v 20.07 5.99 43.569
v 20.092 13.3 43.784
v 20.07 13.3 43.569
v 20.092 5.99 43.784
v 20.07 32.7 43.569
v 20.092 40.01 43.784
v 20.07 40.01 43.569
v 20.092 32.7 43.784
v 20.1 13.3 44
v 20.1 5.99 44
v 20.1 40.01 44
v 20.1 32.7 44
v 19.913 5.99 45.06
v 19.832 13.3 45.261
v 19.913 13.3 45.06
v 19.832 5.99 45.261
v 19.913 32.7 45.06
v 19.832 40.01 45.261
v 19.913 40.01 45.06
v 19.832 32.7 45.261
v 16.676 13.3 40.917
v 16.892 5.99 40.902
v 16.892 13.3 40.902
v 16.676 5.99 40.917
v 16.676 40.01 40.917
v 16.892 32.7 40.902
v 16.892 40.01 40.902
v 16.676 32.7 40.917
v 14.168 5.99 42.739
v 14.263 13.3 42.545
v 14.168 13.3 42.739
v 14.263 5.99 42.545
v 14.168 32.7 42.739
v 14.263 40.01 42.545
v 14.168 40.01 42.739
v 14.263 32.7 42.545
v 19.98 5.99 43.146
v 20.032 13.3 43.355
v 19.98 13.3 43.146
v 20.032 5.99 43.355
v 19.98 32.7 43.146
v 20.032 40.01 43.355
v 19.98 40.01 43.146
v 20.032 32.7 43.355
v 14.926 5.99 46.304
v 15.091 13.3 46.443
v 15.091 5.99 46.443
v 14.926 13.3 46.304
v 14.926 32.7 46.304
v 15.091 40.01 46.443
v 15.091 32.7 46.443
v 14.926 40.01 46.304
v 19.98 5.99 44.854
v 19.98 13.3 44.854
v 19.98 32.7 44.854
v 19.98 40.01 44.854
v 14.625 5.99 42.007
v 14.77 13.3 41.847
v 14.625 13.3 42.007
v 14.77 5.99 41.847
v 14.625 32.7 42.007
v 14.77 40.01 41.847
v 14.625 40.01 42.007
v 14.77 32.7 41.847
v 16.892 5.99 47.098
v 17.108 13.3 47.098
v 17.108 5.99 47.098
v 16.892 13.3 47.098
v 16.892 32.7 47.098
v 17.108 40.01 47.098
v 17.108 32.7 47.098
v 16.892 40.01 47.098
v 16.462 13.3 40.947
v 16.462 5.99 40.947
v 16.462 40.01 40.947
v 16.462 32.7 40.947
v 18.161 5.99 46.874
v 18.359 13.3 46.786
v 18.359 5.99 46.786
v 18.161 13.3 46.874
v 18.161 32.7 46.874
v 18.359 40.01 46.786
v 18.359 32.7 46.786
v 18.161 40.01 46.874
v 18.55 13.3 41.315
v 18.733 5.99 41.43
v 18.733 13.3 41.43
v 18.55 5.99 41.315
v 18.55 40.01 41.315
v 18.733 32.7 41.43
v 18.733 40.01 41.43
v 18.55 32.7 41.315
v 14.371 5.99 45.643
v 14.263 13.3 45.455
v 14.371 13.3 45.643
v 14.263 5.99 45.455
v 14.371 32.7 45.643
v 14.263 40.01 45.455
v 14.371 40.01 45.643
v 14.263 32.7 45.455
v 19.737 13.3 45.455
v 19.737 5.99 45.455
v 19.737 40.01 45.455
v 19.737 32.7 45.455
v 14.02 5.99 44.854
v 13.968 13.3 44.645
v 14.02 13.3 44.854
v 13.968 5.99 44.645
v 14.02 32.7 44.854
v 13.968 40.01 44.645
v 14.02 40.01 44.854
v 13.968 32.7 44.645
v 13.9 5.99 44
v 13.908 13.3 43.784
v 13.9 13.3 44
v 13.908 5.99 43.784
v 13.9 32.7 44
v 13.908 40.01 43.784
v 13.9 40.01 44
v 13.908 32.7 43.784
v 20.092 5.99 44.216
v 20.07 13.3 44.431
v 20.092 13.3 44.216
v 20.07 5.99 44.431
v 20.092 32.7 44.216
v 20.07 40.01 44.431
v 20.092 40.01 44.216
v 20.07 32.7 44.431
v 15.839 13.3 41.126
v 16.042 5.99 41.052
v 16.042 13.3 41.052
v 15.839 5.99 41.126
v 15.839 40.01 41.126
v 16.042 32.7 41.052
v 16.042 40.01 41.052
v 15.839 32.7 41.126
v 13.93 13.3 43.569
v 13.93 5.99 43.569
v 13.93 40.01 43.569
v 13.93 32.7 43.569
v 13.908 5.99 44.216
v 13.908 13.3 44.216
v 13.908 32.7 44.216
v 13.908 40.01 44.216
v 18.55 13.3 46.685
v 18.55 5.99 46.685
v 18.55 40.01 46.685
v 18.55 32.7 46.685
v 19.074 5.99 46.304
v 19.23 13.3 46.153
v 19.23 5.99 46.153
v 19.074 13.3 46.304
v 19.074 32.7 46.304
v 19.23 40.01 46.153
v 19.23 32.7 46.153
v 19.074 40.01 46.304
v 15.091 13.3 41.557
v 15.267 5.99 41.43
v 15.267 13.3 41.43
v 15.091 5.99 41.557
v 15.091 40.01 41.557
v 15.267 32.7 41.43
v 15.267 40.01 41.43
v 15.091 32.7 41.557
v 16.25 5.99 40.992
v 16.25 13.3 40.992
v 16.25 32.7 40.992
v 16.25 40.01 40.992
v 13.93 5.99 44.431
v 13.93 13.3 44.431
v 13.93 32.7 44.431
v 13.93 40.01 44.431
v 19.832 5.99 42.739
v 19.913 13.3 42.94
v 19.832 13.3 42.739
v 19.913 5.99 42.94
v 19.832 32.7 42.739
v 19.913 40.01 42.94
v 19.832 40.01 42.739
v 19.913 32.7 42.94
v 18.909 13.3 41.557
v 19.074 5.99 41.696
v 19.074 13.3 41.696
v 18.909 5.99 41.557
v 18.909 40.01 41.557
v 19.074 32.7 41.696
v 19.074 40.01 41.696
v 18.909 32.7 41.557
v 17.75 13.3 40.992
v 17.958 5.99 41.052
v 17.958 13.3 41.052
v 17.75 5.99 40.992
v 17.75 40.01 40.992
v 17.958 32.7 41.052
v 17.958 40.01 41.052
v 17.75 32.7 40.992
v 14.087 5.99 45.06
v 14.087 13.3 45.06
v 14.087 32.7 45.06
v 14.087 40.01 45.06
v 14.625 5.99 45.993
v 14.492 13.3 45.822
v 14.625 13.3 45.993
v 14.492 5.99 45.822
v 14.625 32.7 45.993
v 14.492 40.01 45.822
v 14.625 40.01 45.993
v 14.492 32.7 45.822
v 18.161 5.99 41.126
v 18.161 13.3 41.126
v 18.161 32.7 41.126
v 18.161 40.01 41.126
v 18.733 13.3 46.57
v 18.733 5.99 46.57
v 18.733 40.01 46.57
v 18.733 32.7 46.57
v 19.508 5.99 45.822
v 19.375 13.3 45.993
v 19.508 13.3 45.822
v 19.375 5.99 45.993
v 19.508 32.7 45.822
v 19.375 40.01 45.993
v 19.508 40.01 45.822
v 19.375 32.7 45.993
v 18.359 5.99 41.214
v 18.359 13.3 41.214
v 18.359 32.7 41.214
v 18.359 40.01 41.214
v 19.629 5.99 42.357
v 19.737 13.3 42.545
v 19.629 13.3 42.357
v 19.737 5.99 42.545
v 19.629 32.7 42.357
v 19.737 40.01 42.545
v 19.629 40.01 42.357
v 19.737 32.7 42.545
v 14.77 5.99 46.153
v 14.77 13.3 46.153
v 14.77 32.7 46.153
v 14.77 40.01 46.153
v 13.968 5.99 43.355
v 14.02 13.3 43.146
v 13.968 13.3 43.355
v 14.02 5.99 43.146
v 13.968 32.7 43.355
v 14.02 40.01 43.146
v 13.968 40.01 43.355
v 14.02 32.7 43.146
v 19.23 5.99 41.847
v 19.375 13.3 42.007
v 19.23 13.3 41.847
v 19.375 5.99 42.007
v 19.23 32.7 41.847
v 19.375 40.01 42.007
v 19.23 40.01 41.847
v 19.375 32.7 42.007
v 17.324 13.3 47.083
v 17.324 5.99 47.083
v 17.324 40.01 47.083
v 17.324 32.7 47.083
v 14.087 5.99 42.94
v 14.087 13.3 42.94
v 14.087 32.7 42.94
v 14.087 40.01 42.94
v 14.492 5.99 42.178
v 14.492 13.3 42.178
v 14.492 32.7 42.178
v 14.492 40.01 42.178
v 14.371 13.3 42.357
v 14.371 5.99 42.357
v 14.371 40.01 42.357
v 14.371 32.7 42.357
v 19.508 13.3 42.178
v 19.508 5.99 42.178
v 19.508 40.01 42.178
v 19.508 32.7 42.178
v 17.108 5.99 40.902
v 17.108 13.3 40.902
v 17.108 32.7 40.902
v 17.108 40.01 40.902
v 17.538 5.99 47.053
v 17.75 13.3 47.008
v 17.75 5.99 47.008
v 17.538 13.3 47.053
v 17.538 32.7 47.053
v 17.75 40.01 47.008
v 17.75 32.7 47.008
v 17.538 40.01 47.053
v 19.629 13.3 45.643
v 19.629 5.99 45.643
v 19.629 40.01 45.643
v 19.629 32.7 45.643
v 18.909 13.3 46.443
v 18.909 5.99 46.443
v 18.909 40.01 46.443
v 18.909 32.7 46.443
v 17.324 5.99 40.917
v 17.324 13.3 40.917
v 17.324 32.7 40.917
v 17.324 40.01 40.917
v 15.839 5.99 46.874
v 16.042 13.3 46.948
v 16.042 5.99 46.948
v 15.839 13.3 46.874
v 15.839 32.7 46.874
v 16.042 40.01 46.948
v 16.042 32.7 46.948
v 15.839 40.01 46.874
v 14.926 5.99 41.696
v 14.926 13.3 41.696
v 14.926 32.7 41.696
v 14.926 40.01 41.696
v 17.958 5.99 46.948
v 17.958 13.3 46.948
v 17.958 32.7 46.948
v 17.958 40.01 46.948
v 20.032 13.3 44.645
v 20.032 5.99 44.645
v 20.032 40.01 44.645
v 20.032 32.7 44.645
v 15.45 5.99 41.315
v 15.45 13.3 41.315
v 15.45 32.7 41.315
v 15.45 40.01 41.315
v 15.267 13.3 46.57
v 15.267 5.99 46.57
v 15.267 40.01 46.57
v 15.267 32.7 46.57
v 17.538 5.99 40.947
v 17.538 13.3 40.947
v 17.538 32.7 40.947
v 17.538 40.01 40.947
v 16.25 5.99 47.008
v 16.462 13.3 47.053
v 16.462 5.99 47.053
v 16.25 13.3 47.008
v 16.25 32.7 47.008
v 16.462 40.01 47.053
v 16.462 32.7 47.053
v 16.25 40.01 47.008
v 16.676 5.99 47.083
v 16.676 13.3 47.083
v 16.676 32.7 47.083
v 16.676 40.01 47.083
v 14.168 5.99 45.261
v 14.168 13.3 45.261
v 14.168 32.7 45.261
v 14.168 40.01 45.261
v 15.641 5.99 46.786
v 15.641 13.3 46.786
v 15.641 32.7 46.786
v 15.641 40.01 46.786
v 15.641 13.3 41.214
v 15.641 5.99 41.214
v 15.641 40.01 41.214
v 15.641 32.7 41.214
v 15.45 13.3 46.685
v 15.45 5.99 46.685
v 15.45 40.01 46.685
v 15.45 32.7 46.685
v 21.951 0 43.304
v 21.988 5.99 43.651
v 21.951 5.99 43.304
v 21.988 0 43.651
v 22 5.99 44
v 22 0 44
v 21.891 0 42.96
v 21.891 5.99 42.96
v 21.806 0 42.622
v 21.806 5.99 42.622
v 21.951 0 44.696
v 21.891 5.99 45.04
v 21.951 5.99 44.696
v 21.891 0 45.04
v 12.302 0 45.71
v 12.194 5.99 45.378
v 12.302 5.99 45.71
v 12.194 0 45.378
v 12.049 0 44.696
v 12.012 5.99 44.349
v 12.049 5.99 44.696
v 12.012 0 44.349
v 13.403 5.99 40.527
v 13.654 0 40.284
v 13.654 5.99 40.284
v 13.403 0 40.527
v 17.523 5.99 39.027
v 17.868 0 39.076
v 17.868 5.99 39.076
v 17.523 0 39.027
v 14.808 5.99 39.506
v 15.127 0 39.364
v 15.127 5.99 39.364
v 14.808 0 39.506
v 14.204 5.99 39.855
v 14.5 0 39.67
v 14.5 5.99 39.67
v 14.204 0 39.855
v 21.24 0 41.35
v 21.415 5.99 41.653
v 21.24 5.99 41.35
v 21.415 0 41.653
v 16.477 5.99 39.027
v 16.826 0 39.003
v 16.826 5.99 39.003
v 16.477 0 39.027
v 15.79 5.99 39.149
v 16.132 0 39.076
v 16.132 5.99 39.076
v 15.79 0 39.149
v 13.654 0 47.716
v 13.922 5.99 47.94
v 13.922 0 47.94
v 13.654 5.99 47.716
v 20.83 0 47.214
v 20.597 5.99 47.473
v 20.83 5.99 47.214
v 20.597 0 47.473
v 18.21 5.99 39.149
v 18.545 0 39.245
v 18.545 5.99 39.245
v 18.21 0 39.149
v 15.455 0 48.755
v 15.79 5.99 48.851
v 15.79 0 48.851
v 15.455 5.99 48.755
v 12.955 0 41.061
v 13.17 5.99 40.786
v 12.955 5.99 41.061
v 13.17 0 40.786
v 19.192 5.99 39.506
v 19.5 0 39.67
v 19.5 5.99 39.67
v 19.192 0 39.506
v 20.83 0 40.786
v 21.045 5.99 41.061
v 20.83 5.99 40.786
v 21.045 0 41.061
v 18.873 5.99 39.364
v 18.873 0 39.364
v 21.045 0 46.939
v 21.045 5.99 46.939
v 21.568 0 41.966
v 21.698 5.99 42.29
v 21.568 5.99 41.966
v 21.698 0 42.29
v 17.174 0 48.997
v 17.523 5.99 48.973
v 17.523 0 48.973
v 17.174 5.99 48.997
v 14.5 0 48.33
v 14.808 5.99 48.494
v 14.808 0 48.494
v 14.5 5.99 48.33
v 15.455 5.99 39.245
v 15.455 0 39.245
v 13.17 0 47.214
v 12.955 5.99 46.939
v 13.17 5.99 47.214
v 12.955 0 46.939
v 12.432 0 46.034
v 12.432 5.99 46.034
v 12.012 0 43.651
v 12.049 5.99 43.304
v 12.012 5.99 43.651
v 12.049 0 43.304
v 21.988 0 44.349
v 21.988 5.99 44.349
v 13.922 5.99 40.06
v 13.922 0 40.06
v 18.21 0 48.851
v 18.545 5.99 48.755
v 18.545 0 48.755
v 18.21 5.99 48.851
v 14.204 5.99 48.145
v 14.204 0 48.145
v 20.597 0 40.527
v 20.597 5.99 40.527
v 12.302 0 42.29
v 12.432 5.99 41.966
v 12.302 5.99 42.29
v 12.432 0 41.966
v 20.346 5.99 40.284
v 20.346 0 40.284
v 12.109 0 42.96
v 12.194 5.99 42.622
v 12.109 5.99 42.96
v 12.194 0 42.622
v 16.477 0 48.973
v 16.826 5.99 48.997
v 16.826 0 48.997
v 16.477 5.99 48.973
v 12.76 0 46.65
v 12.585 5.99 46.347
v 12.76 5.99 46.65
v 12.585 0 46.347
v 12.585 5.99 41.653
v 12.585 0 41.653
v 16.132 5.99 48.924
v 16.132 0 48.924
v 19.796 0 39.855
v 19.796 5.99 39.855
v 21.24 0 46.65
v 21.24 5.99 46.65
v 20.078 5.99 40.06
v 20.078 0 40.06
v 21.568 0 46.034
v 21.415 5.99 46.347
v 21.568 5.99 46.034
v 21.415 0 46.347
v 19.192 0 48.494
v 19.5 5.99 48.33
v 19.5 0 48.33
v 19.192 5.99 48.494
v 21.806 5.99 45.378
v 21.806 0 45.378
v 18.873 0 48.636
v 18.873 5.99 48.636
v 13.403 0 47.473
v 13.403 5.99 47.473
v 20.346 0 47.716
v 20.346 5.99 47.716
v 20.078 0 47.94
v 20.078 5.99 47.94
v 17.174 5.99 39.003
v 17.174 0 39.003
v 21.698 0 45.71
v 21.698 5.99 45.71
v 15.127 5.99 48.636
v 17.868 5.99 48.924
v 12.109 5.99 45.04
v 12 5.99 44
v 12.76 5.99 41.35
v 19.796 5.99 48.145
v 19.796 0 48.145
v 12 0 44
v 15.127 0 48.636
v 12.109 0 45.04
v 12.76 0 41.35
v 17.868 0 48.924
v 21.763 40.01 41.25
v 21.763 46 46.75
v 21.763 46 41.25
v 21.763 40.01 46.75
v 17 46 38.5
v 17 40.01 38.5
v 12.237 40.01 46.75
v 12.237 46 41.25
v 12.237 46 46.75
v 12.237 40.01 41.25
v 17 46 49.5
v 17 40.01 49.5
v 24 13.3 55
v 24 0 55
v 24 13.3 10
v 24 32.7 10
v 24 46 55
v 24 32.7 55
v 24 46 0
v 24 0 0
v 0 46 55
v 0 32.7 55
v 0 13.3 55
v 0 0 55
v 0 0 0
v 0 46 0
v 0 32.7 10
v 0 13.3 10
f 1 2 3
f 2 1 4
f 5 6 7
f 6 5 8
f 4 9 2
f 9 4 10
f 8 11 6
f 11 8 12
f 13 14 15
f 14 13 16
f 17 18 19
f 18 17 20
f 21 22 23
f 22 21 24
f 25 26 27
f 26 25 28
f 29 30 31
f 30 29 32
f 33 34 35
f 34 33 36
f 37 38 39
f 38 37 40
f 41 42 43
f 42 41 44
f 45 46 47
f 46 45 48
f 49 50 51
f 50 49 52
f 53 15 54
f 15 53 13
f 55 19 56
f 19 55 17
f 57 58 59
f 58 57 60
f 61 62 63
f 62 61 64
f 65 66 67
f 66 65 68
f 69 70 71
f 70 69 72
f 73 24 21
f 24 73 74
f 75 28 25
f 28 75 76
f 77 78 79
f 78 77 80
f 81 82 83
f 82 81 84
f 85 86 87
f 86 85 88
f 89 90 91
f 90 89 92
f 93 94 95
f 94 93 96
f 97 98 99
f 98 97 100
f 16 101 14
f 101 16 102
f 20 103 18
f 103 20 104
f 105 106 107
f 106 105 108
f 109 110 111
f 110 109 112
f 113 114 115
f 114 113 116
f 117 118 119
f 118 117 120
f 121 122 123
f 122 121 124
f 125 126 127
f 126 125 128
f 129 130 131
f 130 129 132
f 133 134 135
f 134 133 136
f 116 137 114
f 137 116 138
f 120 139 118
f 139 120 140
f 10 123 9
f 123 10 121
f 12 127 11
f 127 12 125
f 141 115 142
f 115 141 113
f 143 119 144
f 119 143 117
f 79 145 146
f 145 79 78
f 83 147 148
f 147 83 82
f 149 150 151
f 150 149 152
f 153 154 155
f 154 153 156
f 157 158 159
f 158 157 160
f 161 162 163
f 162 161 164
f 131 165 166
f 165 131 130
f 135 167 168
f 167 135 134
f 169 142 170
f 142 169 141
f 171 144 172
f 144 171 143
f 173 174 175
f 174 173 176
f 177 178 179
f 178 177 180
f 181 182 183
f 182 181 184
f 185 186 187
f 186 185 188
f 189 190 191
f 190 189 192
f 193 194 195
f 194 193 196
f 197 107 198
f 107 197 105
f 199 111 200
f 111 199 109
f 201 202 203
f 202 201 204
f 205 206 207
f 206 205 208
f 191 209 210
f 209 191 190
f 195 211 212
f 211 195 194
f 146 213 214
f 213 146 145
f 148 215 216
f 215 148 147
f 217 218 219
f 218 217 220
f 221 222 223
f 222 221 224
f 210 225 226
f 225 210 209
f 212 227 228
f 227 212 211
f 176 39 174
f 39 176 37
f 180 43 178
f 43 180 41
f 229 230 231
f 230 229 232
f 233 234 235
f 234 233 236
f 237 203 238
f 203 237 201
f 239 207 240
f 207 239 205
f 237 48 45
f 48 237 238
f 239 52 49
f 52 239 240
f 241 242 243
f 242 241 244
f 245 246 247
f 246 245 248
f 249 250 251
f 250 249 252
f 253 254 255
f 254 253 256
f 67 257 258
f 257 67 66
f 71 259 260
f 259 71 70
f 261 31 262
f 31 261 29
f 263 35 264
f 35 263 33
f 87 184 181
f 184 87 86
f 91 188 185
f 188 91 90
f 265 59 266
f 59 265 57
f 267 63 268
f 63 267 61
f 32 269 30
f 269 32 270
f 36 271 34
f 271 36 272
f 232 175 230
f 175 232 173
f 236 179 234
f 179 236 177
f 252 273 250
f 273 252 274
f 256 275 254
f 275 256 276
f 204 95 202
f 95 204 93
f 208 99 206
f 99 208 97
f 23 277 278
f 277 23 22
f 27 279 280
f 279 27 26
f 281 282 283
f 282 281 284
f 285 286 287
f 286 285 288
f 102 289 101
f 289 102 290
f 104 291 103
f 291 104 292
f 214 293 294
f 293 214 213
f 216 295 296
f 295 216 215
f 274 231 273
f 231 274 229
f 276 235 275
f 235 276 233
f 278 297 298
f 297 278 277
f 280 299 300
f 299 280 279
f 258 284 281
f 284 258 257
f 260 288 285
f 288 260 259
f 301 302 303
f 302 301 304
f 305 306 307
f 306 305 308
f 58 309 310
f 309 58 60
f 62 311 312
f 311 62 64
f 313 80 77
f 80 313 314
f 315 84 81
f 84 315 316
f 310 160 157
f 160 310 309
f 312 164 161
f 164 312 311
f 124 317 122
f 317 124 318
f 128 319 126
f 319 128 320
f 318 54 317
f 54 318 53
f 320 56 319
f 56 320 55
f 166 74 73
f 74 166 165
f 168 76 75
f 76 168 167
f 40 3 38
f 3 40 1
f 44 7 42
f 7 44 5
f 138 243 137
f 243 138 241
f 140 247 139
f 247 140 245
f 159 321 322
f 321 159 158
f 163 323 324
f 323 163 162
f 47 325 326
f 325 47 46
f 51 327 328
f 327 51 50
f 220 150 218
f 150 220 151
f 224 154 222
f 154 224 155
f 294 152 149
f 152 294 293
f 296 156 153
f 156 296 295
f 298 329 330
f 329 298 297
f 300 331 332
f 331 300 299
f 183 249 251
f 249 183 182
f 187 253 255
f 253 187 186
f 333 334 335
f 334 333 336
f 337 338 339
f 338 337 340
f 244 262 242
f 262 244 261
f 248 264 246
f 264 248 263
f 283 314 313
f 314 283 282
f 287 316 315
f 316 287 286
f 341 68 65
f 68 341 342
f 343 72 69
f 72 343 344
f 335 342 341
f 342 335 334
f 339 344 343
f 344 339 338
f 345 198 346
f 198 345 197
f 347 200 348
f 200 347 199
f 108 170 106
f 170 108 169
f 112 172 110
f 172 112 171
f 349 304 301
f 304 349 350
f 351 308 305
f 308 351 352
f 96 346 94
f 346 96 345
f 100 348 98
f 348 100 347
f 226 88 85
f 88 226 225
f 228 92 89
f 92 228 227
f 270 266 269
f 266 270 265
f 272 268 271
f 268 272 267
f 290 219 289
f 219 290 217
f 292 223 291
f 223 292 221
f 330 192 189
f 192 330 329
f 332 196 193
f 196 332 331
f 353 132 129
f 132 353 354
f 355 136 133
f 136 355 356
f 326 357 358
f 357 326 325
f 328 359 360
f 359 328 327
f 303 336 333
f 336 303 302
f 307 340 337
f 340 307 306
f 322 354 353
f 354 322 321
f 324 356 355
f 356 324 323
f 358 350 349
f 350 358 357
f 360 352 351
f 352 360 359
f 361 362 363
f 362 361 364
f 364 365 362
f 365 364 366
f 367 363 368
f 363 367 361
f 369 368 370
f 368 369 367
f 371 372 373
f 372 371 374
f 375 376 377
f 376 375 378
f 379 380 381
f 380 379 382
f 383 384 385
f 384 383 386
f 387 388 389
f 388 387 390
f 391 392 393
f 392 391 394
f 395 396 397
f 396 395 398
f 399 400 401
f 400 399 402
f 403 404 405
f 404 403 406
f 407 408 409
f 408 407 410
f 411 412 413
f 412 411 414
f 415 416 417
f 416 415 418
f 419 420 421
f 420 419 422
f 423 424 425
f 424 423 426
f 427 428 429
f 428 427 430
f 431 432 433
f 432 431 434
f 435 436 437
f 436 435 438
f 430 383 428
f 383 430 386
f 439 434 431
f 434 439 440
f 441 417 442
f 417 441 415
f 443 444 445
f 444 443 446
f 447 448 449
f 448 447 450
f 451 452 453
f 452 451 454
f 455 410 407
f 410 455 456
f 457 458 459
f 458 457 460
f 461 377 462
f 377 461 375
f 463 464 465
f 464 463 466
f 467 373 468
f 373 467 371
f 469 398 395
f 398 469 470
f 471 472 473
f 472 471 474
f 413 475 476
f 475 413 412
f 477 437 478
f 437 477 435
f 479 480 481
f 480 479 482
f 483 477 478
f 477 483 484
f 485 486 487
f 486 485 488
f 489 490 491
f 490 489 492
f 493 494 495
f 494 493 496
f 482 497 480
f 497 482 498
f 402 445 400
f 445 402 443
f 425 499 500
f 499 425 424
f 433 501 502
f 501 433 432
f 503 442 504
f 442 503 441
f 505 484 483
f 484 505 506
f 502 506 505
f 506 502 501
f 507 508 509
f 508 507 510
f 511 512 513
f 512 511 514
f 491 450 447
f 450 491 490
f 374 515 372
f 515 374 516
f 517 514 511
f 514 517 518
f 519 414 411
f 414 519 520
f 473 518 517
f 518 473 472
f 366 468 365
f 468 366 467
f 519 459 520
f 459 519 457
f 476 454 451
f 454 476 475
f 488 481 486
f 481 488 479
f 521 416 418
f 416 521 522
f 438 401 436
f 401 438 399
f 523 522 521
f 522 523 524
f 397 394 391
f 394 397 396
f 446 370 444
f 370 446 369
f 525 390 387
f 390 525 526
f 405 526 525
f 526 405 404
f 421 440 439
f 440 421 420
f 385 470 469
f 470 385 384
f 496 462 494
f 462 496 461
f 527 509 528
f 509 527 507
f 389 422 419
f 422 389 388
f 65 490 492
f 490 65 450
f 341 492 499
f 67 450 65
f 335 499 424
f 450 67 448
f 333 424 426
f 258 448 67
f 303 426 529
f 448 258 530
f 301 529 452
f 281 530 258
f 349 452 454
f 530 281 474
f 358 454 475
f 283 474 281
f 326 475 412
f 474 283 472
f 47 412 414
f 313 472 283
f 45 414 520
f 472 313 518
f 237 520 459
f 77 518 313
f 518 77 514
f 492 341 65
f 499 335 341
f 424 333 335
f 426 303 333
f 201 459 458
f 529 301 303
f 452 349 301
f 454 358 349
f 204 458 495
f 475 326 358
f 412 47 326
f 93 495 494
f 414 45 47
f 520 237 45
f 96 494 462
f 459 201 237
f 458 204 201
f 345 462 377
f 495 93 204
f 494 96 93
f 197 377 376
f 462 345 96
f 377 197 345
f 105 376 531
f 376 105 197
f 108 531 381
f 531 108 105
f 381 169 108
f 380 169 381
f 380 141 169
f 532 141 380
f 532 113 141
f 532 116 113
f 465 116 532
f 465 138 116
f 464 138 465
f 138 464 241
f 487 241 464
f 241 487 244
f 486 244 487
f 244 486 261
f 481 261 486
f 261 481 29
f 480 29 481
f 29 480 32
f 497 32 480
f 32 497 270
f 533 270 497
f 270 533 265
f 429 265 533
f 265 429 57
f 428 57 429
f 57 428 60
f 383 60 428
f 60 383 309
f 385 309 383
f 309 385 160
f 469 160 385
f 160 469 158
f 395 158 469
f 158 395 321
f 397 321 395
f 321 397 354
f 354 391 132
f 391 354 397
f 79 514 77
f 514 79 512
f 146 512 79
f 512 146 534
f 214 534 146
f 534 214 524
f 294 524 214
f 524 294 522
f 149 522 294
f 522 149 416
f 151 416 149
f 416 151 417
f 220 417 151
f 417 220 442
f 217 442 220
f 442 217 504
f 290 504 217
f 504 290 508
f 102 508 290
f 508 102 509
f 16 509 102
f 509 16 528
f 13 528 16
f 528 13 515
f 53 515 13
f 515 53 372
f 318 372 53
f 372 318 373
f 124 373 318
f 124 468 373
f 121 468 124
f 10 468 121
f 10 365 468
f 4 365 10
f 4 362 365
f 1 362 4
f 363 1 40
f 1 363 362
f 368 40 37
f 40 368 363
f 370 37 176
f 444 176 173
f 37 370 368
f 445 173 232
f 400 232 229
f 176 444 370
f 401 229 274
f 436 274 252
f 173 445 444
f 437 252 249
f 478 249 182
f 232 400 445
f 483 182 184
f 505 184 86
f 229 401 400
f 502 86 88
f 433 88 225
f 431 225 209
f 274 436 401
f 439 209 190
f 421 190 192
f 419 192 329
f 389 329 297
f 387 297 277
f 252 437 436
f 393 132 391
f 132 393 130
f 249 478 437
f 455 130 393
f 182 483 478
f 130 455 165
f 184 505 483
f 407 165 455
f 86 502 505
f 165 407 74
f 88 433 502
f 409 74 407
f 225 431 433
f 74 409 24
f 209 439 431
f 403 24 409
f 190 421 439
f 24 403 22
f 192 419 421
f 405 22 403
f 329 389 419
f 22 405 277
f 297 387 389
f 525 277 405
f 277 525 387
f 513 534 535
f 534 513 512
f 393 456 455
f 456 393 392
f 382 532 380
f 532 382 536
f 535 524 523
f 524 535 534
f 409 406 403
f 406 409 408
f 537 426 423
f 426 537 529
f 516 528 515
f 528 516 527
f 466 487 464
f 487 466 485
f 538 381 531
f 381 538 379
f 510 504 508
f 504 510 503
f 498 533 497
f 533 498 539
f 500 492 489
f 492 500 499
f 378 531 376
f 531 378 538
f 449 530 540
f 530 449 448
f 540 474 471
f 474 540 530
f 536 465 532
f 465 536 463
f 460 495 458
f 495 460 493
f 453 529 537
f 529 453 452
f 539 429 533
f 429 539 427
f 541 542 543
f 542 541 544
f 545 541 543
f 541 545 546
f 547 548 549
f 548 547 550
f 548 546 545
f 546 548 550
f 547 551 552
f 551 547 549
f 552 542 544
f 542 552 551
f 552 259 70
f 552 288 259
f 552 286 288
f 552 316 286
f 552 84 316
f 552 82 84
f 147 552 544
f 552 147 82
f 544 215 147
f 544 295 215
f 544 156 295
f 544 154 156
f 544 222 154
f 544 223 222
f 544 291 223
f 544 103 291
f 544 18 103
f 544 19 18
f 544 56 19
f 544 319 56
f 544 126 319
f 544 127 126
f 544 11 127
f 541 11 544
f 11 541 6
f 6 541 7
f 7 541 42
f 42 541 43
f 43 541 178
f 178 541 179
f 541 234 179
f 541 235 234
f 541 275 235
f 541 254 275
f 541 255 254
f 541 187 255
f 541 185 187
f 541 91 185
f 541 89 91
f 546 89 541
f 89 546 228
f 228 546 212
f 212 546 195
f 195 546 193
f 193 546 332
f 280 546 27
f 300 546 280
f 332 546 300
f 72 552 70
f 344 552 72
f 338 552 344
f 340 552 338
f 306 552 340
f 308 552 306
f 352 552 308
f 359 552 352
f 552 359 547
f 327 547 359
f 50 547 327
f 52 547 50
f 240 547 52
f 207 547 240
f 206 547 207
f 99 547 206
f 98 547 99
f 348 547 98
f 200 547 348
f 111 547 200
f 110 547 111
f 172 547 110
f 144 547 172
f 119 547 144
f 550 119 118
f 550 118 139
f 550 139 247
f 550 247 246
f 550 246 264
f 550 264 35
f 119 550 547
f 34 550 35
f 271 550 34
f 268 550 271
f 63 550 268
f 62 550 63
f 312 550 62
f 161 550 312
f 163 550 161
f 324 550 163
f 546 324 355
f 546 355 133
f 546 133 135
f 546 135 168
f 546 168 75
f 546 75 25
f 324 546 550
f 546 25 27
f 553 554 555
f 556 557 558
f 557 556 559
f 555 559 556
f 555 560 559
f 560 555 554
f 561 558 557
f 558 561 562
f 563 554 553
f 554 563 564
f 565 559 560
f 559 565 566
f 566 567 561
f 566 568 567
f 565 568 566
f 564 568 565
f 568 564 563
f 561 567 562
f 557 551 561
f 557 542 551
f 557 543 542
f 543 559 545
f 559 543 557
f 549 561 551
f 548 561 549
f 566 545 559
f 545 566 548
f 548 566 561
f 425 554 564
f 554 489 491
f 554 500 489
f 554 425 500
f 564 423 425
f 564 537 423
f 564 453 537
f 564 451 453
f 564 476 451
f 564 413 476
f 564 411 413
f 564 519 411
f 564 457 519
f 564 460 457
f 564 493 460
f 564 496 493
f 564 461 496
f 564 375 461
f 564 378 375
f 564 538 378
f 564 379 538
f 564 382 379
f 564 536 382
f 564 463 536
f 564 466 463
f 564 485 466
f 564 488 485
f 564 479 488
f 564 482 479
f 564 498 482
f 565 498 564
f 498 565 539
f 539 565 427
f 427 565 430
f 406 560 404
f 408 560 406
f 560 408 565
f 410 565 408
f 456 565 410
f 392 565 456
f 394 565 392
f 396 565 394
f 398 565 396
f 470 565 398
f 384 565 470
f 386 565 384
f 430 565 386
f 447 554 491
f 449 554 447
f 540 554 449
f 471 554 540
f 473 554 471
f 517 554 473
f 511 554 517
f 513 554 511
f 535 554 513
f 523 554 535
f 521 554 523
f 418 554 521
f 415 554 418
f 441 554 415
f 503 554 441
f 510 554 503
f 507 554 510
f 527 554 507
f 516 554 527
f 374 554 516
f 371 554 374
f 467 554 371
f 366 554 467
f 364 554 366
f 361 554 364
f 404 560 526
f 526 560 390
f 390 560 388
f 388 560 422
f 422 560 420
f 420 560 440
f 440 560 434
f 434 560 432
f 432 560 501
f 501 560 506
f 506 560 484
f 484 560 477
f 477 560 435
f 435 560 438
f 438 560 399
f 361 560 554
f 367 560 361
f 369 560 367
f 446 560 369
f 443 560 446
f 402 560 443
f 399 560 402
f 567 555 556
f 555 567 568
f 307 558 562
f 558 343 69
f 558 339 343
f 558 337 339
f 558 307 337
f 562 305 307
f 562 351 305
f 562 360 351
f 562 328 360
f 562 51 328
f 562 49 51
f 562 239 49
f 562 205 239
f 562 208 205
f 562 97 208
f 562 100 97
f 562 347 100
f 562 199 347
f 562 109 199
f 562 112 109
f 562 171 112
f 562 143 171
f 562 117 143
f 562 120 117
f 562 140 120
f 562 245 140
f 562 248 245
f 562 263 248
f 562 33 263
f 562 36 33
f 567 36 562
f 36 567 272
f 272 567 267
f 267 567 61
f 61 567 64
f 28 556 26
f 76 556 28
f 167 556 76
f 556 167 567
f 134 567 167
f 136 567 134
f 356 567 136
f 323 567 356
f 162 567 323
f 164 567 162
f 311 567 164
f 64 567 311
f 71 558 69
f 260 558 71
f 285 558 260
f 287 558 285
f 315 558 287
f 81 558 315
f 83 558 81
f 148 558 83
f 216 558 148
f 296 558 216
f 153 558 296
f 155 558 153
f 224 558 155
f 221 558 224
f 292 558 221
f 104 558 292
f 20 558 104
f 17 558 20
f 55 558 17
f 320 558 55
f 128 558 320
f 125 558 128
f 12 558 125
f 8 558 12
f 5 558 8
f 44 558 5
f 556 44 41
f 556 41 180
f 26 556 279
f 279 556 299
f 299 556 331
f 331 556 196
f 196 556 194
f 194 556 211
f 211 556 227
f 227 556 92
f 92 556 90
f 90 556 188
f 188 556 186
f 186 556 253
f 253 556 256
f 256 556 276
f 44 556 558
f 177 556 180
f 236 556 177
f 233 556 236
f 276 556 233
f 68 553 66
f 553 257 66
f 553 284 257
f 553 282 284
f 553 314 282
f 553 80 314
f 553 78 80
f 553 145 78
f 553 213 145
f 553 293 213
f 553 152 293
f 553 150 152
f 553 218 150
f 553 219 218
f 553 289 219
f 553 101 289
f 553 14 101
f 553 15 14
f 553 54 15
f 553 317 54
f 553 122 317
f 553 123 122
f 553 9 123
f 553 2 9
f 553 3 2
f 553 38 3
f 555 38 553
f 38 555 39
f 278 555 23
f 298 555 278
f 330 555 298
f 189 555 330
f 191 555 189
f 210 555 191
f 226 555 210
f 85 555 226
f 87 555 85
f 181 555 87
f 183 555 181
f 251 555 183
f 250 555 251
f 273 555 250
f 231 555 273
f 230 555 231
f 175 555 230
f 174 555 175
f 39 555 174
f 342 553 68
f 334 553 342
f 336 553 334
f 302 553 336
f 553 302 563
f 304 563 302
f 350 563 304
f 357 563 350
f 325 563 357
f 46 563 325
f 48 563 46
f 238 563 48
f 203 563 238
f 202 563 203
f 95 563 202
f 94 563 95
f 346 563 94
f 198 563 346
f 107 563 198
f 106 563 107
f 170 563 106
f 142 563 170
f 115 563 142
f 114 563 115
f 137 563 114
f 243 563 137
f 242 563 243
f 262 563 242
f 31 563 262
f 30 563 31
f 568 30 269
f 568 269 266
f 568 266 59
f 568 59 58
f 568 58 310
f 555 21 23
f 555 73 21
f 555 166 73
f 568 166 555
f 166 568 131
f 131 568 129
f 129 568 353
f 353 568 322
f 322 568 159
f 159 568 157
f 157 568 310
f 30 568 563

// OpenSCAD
// general parameters
$fn = 90;
eps = 0.01;
tol = 0.2;

// M6 bolt parameters used in this model
// m6_ is used as prefix
// Bolt Diameter
m6_b_d = 6;
// Bolt Head Diameter
m6_bh_d = 9.8;
// Bolt Head Height
//m6_bh_h = 5.75;
m6_bh_h = 6;
// Bolt Thread Length
m6_bt_l = 40;
// Nut Diameter
m6_n_d = 11;
// Nut Lock Height
m6_nl_h = 6;

// WheelChair Interface parameters
// wci_ as prefix
// x dimension
wci_x = 14+10;
// y dimension
// NOTE: measure y dimension, but not necessary
wci_y = 19;
// z dimension
wci_z = 45;

// WheelChair Interface Hole parameters
// wcih_ as prefix
// outer diameter
wcih_do = 14;
// inner diameter
wcih_di = 6.5;
// distance from the bottom to the center of the hole
wcih_dist = 27 + wcih_do/2;
// length of the cylinder with holes
wcih_l = 23;

// wheelchair interface
module wheelchair_interface()
{
    difference()
    {
        // main block with the horizontal cylinder
        union()
        {
            // main geometry
            cube([wci_x, wci_y, wci_z]);
            
            // horizontal cylinder
            translate([ wci_x-wcih_do/2,
                        (wci_y-wcih_l)/2,
                        wcih_dist])
                rotate([-90,0,0])
                    cylinder(d=wcih_do, h=wcih_l);
        }
        
        // hole for the M6 bolt
        translate([ wci_x-wcih_do/2,
                    (wci_y-wcih_l)/2-eps,
                    wcih_dist])
            rotate([-90,0,0])
                cylinder(d=wcih_di, h=wcih_l+2*eps);
    }
}

//wheelchair_interface();

// interface parameters
// i_ as prefix
// x parameters
i_x = wci_x;
// y parameters
i_y = m6_bt_l + m6_bh_h;
// z parameters
// TODO: determine additional offset
i_z = wci_z + 10;

// interfacing part of the foot support
module interface()
{
    difference()
    {
        // main interface block
        cube([i_x, i_y, i_z]);
        
        // cutting hole for the wheelchair interface
        translate([ -eps,
                    (i_y-wci_y)/2-tol,
                    i_z-wci_z])
            cube([  wci_x+2*eps,
                    wci_y+2*tol,
                    wci_z+eps]);        
        
        // drilling hole fot bolt and nut
        translate([ i_x-wcih_do/2,
                    -eps,
                    i_z-wci_z+wcih_dist])
        rotate([-90,0,0])
        {
            // drilling hole for the bolt
            cylinder(d=m6_b_d+tol, h=i_y+2*eps);
            // drilling hole for the bolt head
            cylinder(d=m6_bh_d+tol, h=m6_bh_h);
            // drilling hole for the nut
            rotate([0,0,90])
                translate([0,0,m6_bt_l+2*eps])
                    cylinder(   d=m6_n_d,
                                h=m6_nl_h,
                                $fn=6);
        }
    }
}

interface();
